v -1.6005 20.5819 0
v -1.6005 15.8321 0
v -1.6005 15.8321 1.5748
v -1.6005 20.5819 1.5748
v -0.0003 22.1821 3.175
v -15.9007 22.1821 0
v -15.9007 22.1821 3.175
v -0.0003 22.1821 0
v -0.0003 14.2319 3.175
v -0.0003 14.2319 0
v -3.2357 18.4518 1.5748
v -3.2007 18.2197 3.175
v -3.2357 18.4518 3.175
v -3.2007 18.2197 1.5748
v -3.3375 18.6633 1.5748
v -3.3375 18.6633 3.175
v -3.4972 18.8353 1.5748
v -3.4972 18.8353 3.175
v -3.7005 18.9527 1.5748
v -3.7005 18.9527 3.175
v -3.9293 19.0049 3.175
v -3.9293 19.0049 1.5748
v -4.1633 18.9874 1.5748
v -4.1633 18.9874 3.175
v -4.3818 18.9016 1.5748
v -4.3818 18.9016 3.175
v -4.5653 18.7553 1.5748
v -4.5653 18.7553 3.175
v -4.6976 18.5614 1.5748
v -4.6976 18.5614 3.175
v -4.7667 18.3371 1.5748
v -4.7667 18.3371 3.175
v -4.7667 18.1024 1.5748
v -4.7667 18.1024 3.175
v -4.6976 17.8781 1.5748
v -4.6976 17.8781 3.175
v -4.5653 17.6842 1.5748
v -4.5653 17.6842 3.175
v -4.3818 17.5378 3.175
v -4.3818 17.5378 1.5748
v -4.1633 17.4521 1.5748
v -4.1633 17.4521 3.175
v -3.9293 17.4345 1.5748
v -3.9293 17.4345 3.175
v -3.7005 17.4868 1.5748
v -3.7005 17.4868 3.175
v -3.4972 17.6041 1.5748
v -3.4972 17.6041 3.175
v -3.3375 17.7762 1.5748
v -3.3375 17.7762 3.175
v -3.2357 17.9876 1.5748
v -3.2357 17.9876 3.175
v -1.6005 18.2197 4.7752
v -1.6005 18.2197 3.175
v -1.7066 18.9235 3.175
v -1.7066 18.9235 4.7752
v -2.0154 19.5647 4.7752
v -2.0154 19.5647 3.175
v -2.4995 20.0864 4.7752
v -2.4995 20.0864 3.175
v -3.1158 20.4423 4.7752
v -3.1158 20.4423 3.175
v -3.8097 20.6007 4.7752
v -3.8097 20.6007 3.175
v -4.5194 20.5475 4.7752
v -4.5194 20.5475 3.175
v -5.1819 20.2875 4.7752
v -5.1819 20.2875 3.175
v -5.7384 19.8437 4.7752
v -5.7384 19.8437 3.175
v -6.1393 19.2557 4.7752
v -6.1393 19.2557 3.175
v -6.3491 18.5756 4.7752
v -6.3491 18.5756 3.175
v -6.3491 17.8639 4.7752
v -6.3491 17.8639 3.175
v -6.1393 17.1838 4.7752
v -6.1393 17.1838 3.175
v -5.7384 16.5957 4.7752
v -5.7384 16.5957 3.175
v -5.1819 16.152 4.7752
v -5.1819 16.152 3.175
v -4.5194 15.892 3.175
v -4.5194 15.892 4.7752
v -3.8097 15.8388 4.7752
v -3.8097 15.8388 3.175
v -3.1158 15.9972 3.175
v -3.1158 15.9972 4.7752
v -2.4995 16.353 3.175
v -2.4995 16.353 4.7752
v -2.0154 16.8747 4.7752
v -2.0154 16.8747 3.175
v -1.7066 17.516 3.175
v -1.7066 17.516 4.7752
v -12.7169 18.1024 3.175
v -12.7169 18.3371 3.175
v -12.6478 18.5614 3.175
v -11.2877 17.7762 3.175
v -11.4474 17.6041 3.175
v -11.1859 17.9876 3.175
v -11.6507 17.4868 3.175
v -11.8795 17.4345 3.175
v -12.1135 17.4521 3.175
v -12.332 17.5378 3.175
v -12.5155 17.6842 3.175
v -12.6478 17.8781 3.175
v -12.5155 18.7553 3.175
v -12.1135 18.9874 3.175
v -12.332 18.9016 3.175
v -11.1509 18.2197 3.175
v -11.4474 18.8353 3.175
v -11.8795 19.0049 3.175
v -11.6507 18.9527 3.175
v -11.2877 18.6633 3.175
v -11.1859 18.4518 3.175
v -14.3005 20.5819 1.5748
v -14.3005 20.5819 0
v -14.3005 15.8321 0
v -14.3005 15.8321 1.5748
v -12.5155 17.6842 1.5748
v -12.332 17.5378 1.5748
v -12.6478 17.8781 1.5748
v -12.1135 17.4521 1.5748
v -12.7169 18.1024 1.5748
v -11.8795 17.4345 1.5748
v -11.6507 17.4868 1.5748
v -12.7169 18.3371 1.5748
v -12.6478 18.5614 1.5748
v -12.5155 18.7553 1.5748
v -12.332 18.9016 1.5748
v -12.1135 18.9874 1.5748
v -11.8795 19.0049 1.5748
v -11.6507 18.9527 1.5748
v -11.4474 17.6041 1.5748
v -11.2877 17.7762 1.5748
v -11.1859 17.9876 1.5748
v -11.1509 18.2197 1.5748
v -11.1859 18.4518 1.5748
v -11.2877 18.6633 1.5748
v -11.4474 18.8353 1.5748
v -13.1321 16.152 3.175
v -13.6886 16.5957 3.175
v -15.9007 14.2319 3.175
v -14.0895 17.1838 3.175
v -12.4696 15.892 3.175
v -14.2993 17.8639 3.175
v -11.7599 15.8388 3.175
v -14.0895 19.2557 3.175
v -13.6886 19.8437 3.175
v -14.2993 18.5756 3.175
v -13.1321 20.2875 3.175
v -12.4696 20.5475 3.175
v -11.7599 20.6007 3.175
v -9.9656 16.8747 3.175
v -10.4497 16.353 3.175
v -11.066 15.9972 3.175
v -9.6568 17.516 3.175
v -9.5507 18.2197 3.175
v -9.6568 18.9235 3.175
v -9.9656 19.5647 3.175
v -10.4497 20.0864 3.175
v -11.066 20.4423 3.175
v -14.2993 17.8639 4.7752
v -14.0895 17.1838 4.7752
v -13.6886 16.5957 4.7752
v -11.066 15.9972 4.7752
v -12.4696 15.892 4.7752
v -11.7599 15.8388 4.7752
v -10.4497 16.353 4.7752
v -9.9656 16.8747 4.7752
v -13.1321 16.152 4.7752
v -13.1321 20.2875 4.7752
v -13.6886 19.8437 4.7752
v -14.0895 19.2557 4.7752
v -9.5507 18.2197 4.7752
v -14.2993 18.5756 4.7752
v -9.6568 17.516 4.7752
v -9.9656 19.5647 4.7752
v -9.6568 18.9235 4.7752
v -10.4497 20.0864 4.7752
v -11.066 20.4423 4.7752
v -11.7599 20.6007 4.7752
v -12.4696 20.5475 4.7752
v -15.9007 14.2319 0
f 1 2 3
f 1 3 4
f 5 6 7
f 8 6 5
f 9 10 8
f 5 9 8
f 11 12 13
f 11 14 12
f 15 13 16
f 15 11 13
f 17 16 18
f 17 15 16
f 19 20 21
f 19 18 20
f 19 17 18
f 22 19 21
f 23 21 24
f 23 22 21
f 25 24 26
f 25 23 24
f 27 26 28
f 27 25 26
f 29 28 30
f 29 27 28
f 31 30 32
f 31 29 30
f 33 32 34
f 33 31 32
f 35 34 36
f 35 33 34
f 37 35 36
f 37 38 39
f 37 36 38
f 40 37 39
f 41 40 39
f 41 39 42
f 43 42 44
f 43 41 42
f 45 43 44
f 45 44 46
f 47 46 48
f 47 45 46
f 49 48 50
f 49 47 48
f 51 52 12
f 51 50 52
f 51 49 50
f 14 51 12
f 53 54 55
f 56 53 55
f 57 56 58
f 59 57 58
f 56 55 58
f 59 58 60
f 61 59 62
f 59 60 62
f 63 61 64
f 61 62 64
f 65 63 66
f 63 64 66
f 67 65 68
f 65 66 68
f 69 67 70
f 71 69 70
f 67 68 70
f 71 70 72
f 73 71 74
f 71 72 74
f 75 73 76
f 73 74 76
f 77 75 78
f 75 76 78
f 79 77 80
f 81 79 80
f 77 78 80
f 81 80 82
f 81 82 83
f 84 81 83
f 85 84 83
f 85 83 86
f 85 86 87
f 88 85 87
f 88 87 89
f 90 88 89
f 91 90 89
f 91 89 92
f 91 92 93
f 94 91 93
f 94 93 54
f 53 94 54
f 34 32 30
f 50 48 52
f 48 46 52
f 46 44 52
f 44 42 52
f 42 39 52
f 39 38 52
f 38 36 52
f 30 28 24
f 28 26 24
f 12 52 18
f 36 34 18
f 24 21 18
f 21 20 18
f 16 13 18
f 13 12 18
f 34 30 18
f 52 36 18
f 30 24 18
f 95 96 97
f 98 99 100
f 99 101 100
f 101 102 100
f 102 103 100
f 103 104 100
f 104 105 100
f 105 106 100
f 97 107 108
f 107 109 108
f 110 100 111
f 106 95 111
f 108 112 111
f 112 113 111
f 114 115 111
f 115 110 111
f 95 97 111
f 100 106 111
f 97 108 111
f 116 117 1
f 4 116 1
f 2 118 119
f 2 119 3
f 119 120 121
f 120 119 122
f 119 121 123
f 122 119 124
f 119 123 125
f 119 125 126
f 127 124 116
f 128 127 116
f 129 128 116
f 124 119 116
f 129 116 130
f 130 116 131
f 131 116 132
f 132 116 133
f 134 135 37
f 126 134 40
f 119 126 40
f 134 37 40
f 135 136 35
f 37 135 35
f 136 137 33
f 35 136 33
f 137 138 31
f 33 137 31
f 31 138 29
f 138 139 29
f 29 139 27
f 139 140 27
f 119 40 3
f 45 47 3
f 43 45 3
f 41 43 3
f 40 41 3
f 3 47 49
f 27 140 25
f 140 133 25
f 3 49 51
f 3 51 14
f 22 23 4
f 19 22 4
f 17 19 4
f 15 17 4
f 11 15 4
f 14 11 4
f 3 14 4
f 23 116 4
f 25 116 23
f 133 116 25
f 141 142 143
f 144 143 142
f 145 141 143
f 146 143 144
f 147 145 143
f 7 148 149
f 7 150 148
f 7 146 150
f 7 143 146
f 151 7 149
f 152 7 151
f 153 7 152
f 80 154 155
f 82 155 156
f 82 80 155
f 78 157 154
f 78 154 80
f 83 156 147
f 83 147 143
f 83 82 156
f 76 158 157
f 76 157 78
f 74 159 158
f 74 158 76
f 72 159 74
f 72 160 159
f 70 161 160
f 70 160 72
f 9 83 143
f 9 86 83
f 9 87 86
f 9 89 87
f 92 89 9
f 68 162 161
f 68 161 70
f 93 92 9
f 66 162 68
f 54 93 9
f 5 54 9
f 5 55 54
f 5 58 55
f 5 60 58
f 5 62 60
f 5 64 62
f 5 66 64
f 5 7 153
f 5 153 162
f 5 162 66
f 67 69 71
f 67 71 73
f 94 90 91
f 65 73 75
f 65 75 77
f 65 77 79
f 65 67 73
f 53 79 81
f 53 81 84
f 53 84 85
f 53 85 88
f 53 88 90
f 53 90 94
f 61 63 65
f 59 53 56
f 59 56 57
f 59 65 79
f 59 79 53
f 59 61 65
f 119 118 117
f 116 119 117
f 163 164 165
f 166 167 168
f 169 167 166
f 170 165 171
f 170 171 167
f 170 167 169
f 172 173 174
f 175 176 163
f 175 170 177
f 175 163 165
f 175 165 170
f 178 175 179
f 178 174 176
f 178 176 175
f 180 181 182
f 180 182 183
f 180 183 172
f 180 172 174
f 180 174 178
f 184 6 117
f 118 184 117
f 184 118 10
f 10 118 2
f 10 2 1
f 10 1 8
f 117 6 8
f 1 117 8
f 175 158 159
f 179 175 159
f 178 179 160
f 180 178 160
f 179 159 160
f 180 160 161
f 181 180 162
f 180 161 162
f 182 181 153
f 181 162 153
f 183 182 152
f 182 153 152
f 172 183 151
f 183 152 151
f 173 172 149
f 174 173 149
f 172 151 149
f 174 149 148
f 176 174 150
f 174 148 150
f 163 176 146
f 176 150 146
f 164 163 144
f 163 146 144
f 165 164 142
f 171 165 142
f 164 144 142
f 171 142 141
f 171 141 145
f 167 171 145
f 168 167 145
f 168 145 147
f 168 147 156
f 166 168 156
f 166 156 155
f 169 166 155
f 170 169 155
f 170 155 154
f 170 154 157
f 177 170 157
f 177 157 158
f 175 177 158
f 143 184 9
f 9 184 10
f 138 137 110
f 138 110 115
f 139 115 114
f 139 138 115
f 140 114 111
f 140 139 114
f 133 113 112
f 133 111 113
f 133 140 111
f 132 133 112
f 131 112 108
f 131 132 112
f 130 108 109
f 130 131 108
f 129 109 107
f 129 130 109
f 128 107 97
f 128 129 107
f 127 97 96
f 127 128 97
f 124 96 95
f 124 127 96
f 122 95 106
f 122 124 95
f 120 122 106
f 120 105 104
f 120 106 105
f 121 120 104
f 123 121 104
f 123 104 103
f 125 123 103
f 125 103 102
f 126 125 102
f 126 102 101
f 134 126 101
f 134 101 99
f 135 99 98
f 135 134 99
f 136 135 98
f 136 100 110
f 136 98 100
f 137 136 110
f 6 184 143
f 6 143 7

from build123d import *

# Parameters (mm, degrees)
F0_W     = 15.9004
F0_H     = 7.9502
F0_R     = 2.3876
F1_DEPTH = 3.175
F2_DEPTH = 4.7752
F3_T     = -1.6002


with BuildPart() as f1:
    # F0 (on Top) → F1 (new body)
    with BuildSketch(Plane.XY):
        with Locations((-7.9505280386, 18.2070285082)):
            Rectangle(F0_W, F0_H)
        with Locations((-11.9383280386, 18.2197285082)):
            Circle(F0_R, mode=Mode.SUBTRACT)
        with Locations((-3.9881280386, 18.2197285082)):
            Circle(F0_R, mode=Mode.SUBTRACT)
    extrude(amount=F1_DEPTH)

    # F0 (on Top) → F2 (join)
    with BuildSketch(Plane.XY):
        with Locations((-11.9383280386, 18.2197285082)):
            Circle(F0_R)
        with Locations((-3.9881280386, 18.2197285082)):
            Circle(F0_R)
    extrude(amount=F2_DEPTH)

    # F3
    f3_openings = [f1.faces().sort_by_distance(p)[0] for p in [
        (-7.950528, 18.207029, 0),
    ]]
    offset(amount=F3_T, openings=f3_openings, kind=Kind.INTERSECTION)


solid = f1.part
